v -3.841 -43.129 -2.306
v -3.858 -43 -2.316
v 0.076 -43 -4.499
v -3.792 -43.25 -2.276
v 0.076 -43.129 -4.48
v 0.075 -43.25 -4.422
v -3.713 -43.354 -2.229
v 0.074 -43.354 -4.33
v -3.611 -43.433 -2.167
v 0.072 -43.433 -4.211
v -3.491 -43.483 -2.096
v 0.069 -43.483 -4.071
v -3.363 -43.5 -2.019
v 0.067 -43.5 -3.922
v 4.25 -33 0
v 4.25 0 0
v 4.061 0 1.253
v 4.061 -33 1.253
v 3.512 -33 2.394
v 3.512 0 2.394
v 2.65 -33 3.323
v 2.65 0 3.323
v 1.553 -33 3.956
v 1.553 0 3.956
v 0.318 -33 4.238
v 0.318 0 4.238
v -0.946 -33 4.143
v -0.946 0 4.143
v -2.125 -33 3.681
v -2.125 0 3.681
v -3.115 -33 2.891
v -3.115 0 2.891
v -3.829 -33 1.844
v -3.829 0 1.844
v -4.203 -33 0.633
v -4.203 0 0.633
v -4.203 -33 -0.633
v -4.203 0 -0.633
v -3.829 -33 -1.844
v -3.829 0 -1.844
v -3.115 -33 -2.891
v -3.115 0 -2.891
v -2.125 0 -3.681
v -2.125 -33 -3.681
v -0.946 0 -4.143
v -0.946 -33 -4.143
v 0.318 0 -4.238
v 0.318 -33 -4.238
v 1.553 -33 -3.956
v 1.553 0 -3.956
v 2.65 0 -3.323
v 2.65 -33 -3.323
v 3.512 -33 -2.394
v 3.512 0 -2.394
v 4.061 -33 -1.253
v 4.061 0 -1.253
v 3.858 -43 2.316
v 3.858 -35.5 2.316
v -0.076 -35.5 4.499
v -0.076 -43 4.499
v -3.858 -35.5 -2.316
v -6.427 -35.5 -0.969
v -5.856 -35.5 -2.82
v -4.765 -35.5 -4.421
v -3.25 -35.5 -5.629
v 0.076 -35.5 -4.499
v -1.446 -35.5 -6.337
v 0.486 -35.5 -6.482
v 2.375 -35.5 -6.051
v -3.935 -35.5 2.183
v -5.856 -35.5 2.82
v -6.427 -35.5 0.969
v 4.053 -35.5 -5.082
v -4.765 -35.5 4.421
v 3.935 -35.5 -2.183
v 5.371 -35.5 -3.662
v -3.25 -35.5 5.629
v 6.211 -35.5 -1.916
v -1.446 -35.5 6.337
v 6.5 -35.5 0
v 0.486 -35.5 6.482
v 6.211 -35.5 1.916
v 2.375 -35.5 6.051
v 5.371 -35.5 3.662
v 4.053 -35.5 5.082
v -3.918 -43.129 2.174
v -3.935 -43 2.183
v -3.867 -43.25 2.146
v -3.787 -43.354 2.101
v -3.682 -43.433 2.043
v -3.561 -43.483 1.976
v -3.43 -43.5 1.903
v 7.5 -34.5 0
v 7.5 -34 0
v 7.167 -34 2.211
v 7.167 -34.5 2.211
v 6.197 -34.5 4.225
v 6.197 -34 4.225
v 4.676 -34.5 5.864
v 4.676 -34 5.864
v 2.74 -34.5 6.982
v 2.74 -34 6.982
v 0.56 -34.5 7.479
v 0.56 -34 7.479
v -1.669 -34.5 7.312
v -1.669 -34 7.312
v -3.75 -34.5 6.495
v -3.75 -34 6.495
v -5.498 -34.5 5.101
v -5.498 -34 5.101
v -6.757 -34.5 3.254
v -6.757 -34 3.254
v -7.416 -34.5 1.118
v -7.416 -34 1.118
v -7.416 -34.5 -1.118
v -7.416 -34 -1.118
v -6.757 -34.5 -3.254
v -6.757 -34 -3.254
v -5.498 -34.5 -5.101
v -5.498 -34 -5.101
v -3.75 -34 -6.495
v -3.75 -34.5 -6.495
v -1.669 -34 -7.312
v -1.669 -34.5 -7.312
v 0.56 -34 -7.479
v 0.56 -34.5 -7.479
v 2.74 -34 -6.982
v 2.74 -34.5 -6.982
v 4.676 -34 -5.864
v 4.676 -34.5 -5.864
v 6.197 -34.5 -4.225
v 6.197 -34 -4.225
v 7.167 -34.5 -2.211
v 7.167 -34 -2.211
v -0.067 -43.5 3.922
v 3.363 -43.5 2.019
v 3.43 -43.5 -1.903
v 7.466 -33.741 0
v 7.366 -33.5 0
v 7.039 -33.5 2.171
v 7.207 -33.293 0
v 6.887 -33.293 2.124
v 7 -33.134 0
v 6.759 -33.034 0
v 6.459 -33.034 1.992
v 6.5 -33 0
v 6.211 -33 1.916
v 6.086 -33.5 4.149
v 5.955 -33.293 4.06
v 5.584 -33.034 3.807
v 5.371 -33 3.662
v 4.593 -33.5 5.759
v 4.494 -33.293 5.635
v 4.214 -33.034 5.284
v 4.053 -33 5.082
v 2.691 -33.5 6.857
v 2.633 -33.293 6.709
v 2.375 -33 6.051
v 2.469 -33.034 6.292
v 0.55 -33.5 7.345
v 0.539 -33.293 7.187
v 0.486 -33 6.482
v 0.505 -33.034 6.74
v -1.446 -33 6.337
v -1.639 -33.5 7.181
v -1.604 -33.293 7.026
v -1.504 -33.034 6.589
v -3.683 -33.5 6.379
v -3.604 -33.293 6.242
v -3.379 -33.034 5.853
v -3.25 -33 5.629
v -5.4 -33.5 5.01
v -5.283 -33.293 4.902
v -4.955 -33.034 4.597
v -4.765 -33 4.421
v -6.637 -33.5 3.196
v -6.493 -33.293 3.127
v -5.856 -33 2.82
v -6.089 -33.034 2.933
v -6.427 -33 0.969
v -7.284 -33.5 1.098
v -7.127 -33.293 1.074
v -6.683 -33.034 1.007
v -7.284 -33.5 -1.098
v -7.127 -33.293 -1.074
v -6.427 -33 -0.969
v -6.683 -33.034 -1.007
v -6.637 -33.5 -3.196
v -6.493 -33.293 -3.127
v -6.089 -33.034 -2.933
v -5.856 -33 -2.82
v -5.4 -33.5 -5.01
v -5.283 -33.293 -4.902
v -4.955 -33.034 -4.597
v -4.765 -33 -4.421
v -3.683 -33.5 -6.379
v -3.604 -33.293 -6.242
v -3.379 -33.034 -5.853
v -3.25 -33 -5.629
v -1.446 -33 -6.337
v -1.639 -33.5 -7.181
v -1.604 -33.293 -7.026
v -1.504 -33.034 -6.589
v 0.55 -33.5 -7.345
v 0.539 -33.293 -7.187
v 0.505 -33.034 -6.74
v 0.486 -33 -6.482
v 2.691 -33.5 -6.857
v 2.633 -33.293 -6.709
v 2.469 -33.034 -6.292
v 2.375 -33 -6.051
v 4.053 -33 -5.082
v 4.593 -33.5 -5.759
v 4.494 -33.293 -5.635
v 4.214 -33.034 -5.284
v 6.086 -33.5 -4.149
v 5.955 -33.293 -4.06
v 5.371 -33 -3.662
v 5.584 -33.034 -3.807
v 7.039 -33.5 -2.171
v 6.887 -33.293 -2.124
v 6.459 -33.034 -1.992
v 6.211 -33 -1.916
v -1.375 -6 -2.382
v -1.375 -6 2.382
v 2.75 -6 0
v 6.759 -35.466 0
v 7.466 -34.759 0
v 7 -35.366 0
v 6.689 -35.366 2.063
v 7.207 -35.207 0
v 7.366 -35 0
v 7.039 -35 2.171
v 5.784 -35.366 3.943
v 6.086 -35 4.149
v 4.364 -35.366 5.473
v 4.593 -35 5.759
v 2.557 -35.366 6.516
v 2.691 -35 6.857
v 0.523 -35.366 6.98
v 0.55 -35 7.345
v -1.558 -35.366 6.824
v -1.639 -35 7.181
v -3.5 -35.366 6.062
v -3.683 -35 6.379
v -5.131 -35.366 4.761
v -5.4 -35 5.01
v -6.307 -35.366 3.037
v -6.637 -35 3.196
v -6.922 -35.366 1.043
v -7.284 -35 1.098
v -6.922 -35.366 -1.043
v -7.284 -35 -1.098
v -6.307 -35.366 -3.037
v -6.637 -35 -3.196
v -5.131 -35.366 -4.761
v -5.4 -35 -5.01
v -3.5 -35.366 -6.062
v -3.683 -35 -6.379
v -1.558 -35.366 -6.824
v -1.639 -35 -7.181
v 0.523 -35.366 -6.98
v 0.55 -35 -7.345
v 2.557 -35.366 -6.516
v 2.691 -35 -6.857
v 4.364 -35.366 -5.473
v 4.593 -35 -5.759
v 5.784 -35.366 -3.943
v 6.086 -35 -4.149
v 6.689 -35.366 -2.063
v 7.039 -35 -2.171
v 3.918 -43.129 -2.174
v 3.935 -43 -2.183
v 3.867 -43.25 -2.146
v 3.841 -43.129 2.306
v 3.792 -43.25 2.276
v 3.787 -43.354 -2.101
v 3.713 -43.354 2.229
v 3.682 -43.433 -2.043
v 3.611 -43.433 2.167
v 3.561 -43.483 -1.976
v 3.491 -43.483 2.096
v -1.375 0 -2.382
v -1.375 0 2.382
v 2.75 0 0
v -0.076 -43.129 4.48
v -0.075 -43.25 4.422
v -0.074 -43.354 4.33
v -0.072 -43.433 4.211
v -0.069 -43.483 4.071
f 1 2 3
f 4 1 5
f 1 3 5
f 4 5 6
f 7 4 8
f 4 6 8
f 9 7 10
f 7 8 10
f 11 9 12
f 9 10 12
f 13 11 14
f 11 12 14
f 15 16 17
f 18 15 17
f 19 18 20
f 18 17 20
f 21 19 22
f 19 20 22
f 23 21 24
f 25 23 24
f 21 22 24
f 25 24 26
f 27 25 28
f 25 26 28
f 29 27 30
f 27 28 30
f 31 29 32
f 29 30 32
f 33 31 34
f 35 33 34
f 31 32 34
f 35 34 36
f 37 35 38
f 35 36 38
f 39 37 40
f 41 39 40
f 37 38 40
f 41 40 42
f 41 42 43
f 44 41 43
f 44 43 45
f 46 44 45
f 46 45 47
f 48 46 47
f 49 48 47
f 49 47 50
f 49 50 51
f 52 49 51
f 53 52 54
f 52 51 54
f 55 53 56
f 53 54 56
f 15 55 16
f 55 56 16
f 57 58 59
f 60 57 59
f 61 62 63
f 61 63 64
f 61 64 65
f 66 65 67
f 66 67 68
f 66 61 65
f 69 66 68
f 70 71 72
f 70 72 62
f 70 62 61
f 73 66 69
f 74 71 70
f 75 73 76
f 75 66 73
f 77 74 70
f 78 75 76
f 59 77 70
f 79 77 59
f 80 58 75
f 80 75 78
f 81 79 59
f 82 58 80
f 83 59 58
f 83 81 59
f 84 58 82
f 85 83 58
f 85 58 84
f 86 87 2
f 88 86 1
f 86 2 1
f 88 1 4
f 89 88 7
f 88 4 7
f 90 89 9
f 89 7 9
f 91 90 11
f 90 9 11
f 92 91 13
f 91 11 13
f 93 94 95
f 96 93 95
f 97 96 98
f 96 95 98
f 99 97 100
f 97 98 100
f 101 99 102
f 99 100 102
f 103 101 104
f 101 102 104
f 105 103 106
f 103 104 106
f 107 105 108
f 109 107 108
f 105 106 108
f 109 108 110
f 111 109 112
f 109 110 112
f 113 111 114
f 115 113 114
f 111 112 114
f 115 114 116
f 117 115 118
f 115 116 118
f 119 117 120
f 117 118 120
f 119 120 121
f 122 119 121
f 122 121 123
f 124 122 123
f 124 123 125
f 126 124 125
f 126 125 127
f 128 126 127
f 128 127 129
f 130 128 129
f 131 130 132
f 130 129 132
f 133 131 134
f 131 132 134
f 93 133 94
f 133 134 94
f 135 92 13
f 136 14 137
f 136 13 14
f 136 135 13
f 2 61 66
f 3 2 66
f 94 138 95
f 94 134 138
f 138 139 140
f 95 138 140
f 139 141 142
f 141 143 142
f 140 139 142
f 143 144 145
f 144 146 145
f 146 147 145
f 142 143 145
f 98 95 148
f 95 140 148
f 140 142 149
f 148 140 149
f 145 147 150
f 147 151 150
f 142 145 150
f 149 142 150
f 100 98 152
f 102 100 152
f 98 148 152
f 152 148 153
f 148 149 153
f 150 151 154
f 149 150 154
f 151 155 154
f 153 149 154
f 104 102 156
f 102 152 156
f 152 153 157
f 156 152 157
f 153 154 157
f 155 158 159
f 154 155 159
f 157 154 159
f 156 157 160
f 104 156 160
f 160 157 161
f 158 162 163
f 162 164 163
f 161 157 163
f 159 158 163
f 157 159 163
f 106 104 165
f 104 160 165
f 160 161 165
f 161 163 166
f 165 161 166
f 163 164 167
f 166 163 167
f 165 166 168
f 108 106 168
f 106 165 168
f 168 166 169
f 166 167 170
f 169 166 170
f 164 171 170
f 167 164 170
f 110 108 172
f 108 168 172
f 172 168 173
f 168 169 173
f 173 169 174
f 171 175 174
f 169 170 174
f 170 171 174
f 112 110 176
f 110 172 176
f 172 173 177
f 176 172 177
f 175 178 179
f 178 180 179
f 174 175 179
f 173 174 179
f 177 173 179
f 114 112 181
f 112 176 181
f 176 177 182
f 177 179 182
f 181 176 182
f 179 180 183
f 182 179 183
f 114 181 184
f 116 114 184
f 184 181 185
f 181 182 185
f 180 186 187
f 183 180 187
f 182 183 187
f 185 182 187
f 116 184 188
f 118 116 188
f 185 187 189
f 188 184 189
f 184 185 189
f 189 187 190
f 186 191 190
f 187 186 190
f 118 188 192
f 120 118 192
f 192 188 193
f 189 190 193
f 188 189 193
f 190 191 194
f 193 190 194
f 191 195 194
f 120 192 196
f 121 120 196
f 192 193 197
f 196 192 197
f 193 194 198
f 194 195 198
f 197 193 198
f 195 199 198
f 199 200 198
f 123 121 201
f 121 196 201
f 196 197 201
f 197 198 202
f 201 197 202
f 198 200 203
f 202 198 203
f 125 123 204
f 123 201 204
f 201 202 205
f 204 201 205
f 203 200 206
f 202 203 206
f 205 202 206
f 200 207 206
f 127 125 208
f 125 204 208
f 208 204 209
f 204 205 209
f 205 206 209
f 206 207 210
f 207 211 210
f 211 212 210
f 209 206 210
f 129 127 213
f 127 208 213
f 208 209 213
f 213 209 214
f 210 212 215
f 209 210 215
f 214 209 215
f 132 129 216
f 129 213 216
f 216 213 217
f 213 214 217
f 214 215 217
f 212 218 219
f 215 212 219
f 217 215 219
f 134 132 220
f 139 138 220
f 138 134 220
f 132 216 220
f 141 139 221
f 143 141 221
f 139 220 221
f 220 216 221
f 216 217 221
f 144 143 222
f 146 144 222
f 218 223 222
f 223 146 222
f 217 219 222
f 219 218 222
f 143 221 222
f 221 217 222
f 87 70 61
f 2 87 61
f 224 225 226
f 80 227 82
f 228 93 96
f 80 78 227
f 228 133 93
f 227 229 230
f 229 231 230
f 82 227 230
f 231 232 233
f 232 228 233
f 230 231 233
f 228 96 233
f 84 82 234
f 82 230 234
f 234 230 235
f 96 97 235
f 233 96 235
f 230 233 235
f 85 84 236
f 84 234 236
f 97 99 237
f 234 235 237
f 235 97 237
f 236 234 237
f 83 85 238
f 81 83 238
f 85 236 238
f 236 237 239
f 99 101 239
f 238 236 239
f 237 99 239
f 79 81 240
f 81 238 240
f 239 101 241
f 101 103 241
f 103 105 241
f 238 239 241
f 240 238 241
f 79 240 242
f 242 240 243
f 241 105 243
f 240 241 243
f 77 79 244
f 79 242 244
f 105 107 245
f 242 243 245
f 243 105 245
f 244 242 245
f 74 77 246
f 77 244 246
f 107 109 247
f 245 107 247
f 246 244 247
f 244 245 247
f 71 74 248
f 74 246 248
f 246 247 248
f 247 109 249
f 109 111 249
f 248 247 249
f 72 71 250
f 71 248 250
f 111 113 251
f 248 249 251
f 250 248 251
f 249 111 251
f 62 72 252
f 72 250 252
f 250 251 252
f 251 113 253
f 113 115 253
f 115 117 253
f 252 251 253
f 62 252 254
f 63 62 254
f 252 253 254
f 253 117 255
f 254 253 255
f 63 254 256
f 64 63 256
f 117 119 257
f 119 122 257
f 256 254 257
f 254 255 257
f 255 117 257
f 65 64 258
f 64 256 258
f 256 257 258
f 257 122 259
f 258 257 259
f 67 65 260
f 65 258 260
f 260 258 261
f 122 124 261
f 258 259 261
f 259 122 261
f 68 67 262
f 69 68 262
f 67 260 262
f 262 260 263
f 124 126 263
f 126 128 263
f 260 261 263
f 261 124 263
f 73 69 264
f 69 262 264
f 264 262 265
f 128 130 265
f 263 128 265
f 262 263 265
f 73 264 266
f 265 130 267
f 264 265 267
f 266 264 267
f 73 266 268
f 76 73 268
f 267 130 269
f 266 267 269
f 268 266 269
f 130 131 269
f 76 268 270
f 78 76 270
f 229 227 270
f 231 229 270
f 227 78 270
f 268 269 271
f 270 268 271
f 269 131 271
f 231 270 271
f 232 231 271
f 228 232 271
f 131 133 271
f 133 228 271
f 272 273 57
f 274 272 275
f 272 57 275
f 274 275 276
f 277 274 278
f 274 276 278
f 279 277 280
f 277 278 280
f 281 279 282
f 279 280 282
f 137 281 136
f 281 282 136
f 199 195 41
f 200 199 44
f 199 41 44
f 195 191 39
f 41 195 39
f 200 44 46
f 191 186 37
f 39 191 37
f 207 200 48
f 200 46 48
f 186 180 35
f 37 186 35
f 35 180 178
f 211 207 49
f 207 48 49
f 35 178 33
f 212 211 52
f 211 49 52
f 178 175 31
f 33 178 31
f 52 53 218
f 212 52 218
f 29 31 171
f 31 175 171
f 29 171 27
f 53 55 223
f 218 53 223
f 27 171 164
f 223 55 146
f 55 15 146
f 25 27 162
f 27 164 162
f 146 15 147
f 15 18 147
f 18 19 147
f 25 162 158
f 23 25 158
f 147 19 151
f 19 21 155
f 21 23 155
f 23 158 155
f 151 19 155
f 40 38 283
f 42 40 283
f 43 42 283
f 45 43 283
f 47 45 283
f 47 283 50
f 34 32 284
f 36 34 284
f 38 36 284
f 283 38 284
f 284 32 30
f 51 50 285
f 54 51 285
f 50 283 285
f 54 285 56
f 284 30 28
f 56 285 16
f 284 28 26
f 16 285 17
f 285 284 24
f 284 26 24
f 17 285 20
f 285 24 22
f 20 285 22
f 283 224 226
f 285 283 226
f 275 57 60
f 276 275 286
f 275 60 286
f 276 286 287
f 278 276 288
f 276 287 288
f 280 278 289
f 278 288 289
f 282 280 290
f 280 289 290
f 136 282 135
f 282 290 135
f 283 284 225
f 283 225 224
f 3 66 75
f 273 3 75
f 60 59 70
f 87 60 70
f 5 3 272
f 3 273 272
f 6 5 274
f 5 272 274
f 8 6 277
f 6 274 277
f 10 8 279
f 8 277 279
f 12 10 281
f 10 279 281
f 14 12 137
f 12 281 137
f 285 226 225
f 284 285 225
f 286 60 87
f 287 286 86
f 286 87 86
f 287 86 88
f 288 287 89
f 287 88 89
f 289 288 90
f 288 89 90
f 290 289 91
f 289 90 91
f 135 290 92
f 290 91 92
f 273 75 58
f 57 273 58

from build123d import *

# Parameters (mm, degrees)
F0_R     = 4.25
F1_DEPTH = 33
F2_DEPTH = 6
F3_R     = 7.5
F3_R_2   = 4.25
F4_DEPTH = 2.5
F6_DEPTH = 8
F7_R     = 0.5
F8_R     = 1


with BuildPart() as f1:
    # F0 (on Front) → F1 (new body)
    with BuildSketch(Plane.XZ):
        Circle(F0_R)
        Polygon((-1.375, 2.38157), (2.75, 0), (-1.375, -2.38157), align=None, mode=Mode.SUBTRACT)
        Polygon((-1.375, -2.38157), (2.75, 0), (-1.375, 2.38157), align=None)
    extrude(amount=F1_DEPTH)

    # F0 (on Front) → F2 (cut)
    with BuildSketch(Plane.XZ):
        Polygon((-1.375, -2.38157), (2.75, 0), (-1.375, 2.38157), align=None)
    extrude(amount=F2_DEPTH, mode=Mode.SUBTRACT)

    # F3 (on face) → F4 (join)
    with BuildSketch(Plane.XZ.offset(33)):
        Circle(F3_R)
        Circle(F3_R_2, mode=Mode.SUBTRACT)
        Circle(F3_R_2)
    extrude(amount=F4_DEPTH)

    # F5 (on face) → F6 (join)
    with BuildSketch(Plane.XZ.offset(35.5)):
        Polygon((0.076423, -4.499351), (3.934764, -2.183492), (3.858341, 2.315859), (-0.076423, 4.499351), (-3.934764, 2.183492), (-3.858341, -2.315859), align=None)
    extrude(amount=F6_DEPTH)

    # F7
    f7_edges = [f1.edges().sort_by_distance(p)[0] for p in [
        (2.005593, -43.5, -3.341421),
        (-1.890959, -43.5, -3.407605),
        (-3.896552, -43.5, -0.066184),
        (-2.005593, -43.5, 3.341421),
        (1.890959, -43.5, 3.407605),
        (3.896552, -43.5, 0.066184),
    ]]
    fillet(f7_edges, radius=F7_R)

    # F8
    f8_edges = [f1.edges().sort_by_distance(p)[0] for p in [
        (-7.5, -35.5, 0),
        (-7.5, -33, 0),
    ]]
    fillet(f8_edges, radius=F8_R)


solid = f1.part
